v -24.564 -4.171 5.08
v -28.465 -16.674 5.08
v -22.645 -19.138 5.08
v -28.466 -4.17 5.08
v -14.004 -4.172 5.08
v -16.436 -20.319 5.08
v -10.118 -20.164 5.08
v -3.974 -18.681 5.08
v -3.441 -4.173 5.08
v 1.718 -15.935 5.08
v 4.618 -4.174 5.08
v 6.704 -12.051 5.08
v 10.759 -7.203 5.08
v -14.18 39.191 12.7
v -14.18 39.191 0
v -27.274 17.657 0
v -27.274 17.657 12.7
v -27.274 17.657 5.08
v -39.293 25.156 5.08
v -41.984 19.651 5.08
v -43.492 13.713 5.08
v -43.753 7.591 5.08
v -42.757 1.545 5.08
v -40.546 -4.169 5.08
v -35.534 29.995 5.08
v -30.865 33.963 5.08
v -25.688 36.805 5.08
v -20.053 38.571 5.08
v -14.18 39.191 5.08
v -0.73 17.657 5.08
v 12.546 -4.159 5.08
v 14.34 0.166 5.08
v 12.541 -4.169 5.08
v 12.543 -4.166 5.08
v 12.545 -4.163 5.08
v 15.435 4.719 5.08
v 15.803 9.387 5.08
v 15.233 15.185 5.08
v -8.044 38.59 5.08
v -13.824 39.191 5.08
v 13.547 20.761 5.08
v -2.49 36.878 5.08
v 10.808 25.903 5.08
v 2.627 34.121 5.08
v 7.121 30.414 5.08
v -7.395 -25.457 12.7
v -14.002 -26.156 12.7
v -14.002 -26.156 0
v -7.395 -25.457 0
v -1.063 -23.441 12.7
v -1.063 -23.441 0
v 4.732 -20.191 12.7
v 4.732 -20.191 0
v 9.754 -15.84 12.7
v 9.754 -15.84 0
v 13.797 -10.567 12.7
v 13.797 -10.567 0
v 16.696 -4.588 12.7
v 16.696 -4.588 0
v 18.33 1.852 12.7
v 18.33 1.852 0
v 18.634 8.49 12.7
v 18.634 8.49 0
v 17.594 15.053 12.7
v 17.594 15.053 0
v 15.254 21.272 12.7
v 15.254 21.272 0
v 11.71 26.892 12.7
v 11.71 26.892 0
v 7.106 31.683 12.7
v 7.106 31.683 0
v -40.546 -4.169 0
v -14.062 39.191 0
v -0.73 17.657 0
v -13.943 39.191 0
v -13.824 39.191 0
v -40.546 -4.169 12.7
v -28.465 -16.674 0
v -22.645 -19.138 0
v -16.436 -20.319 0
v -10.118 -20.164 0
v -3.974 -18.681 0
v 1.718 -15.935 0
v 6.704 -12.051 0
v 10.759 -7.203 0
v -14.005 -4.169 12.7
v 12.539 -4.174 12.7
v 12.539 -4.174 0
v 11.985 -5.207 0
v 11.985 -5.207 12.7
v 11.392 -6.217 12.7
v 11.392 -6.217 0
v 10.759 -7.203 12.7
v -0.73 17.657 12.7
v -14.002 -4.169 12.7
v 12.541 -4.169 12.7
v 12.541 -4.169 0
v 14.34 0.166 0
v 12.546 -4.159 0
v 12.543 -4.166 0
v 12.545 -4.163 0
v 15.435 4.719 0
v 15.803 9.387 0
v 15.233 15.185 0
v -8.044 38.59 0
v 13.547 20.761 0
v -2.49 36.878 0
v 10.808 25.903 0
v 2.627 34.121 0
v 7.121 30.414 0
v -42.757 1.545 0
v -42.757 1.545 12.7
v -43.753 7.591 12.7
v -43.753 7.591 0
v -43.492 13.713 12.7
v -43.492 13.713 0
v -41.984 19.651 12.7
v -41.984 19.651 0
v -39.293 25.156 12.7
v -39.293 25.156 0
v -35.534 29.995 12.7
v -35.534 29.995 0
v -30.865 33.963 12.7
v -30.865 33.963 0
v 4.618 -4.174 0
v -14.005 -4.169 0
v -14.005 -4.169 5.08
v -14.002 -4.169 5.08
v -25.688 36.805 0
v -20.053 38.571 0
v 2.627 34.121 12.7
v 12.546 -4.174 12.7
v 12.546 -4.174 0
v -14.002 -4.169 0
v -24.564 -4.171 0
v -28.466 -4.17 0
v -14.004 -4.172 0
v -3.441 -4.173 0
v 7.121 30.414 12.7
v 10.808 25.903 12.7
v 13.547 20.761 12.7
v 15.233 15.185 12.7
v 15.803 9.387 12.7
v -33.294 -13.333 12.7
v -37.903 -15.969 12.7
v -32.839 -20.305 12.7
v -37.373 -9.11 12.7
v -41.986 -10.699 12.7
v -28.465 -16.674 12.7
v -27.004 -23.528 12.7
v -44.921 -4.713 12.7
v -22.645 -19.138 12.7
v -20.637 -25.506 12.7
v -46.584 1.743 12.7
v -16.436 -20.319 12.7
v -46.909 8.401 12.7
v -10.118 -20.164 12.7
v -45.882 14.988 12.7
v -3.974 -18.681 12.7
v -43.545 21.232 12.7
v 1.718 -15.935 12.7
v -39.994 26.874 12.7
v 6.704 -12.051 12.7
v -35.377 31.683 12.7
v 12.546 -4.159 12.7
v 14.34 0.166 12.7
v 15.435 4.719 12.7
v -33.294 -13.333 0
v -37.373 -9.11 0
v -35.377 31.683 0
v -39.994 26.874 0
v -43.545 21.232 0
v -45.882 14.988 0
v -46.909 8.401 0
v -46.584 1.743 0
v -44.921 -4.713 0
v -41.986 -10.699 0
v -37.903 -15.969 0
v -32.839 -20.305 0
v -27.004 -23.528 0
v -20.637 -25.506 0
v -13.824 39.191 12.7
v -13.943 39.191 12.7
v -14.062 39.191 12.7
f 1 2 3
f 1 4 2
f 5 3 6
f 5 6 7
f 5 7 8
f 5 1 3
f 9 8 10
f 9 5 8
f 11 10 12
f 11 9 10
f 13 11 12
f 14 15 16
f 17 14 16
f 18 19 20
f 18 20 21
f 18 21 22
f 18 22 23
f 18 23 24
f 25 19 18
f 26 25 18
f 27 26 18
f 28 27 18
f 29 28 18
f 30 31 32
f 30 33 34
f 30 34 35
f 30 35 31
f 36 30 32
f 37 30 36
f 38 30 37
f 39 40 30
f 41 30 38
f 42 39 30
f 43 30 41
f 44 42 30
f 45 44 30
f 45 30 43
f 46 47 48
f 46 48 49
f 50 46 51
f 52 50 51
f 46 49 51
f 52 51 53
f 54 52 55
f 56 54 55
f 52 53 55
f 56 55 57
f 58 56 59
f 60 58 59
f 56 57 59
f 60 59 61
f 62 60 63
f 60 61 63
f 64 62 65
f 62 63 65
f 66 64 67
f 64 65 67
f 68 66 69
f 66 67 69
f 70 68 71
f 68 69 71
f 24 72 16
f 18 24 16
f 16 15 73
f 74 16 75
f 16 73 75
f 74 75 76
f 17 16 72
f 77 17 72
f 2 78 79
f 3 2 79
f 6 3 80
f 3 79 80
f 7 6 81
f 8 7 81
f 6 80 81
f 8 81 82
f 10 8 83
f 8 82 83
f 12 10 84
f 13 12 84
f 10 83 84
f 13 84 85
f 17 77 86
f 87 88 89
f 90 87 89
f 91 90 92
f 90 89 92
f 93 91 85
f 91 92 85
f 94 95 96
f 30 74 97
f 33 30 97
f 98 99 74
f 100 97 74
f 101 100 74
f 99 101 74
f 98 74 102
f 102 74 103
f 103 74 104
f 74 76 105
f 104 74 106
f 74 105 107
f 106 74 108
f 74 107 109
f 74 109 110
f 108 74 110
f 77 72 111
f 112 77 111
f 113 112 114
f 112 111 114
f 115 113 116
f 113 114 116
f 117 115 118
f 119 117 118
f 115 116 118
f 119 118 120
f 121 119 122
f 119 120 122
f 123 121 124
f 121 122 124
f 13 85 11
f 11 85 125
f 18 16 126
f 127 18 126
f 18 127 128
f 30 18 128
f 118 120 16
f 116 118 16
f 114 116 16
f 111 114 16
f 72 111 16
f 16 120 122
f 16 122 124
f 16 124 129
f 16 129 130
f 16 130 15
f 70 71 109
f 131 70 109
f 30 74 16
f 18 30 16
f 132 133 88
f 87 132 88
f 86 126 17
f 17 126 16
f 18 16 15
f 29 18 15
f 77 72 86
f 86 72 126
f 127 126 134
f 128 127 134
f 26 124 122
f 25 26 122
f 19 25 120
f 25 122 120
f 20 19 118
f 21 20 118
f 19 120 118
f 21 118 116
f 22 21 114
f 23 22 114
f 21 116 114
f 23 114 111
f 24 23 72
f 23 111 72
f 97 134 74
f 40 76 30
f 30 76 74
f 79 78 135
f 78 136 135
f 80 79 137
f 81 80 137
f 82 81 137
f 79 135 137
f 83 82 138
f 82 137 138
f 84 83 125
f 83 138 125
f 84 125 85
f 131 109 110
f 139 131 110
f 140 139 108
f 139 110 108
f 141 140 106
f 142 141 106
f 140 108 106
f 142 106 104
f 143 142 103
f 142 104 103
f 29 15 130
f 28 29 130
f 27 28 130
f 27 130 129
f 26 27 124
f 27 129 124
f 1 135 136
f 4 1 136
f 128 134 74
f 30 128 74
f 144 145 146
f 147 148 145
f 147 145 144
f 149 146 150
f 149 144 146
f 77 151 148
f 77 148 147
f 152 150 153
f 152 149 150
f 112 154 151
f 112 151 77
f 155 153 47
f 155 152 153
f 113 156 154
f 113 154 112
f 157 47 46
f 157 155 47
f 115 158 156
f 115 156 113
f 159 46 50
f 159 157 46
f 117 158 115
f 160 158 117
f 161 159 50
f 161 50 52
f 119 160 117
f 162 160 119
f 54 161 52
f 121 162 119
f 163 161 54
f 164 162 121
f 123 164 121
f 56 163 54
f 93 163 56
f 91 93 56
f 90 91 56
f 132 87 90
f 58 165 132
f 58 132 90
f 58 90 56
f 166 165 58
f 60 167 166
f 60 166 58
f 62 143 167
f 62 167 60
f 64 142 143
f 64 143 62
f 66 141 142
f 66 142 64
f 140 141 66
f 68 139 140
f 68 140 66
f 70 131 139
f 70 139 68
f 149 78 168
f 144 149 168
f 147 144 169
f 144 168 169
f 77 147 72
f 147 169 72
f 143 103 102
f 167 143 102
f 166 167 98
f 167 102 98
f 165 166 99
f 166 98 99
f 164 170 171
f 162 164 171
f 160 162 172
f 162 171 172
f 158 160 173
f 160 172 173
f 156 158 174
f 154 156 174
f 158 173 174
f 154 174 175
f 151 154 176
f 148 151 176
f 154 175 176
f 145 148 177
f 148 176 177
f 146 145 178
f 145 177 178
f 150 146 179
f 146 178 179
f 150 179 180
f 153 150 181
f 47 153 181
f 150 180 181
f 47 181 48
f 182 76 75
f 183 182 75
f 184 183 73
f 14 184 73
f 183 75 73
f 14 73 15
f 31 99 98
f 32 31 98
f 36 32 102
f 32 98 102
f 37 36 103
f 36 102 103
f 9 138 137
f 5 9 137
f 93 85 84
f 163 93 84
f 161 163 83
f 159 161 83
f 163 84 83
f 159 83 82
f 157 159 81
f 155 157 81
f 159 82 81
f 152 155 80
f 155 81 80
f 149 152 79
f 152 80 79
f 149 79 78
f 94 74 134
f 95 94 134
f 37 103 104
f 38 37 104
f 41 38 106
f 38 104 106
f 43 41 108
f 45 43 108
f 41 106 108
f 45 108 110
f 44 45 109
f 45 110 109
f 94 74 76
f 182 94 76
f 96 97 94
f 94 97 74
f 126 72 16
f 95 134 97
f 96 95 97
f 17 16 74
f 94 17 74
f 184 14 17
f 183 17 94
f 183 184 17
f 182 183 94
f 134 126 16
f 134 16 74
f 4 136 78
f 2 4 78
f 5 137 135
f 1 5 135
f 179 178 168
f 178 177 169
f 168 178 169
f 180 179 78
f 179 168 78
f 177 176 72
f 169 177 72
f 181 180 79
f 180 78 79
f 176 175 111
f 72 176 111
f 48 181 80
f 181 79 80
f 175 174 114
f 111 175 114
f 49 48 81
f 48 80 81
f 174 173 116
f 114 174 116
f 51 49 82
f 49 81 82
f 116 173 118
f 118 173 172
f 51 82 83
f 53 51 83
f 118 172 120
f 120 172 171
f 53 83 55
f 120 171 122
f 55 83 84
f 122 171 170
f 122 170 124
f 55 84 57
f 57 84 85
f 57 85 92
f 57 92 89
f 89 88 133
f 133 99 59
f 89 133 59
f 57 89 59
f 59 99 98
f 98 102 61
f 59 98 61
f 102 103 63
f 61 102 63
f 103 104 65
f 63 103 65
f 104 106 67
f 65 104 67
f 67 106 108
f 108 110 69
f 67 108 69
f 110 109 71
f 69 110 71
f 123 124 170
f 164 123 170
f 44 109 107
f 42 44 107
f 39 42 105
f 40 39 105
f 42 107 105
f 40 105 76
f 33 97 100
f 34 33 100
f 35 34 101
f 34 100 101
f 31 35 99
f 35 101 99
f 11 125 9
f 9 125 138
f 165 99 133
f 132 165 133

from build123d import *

# Parameters (mm, degrees)
F1_DEPTH = 12.7
F2_DEPTH = 5.08


# Not quite as in the source:
# - a feature names something its author has since deleted; it is built from what else it names


with BuildPart() as f1:
    # F0 (on Top) → F1 (new body)
    with BuildSketch(Plane.XY):
        with BuildLine():
            Line((-0.7304638443, 17.6570977744), (-13.8243847458, 39.1909619838))
            ThreePointArc((-13.8243847458, 39.1909619838), (-14.0022787977, 39.1914928804), (-14.1801728496, 39.1909619839))
            Line((-14.1801728496, 39.1909619839), (-27.2740937544, 17.6570977744))
            Line((-27.2740937544, 17.6570977744), (-0.7304638443, 17.6570977744))
        make_face()
    extrude(amount=F1_DEPTH)


with BuildPart() as f1b:
    # F0 (on Top) → F1, piece 2 (new body)
    with BuildSketch(Plane.XY):
        Polygon((-14.0052981097, -4.1693255842), (-27.2740937544, 17.6570977744), (-40.5459087111, -4.1693255842), (-28.4659001209, -4.1693255842), (-24.5637800544, -4.1693255842), align=None)
    extrude(amount=F1_DEPTH)


with BuildPart() as f1c:
    # F0 (on Top) → F1, piece 3 (new body)
    with BuildSketch(Plane.XY):
        Polygon((4.6093779556, -4.1693255842), (12.5413511092, -4.1693255842), (-0.7304638443, 17.6570977744), (-14.002278801, -4.1693255842), (-3.4407775408, -4.1693255842), align=None)
    extrude(amount=F1_DEPTH)


with BuildPart() as f1d:
    # F0 (on Top) → F1, piece 4 (new body)
    with BuildSketch(Plane.XY):
        with BuildLine():
            ThreePointArc((2.6267673161, 34.121311843), (12.3031850523, 23.3991896828), (15.8025652754, 9.386648804))
            ThreePointArc((15.8025652754, 9.386648804), (14.9770861572, 2.4206501647), (12.5463739719, -4.1594859348))
            Line((12.5463739719, -4.1594859348), (12.546375676, -4.1742923649))
            Line((12.546375676, -4.1742923649), (12.5388143231, -4.1742916575))
            ThreePointArc((12.5388143231, -4.1742916575), (11.6934665545, -5.7149206854), (10.7587911193, -7.2030512181))
            ThreePointArc((10.7587911193, -7.2030512181), (-7.0067815574, -19.5856094569), (-28.4652345808, -16.6738891899))
            ThreePointArc((-28.4652345808, -16.6738891899), (-35.4376711517, -11.3221098549), (-40.5459087111, -4.1693255842))
            ThreePointArc((-40.5459087111, -4.1693255842), (-42.8906697283, 16.7207881569), (-30.8650428104, 33.9625703611))
            Line((-30.8650428104, 33.9625703611), (-35.3768183074, 31.682918978))
            ThreePointArc((-35.3768183074, 31.682918978), (-44.9205686415, -4.7129685745), (-14.0022787977, -26.1559896842))
            ThreePointArc((-14.0022787977, -26.1559896842), (16.6955901847, -4.587967654), (7.1059333978, 31.682918978))
            Line((7.1059333978, 31.682918978), (2.6267673161, 34.121311843))
        make_face()
    extrude(amount=F1_DEPTH)


with BuildPart() as f2:
    # F0 (on Top) → F2 (new body)
    with BuildSketch(Plane.XY):
        Polygon((-14.002278801, -4.1693255842), (-0.7304638443, 17.6570977744), (-27.2740937544, 17.6570977744), (-14.0052981097, -4.1693255842), align=None)
    extrude(amount=F2_DEPTH)


with BuildPart() as f2b:
    # F0 (on Top) → F2, piece 2 (new body)
    with BuildSketch(Plane.XY):
        with BuildLine():
            ThreePointArc((-28.4652345808, -16.6738891899), (-7.0067815574, -19.5856094569), (10.7587911193, -7.2030512181))
            Line((10.7587911193, -7.2030512181), (4.6179422563, -4.1735506603))
            Line((4.6179422563, -4.1735506603), (-3.4407775408, -4.1727967674))
            Line((-3.4407775408, -4.1727967674), (-14.0037886271, -4.1718085983))
            Line((-14.0037886271, -4.1718085983), (-24.5637800544, -4.1708207116))
            Line((-24.5637800544, -4.1708207116), (-28.4659000607, -4.1704556684))
            Line((-28.4659000607, -4.1704556684), (-28.4652345808, -16.6738891899))
        make_face()
    extrude(amount=F2_DEPTH)


with BuildPart() as f2c:
    # F0 (on Top) → F2, piece 3 (new body)
    with BuildSketch(Plane.XY):
        with BuildLine():
            Line((-27.2740937544, 17.6570977744), (-14.1801728496, 39.1909619839))
            ThreePointArc((-14.1801728496, 39.1909619839), (-22.9146312684, 37.8277933645), (-30.8650428104, 33.9625703611))
            ThreePointArc((-30.8650428104, 33.9625703611), (-42.8906697283, 16.7207881569), (-40.5459087111, -4.1693255842))
            Line((-40.5459087111, -4.1693255842), (-27.2740937544, 17.6570977744))
        make_face()
    extrude(amount=F2_DEPTH)


with BuildPart() as f2d:
    # F0 (on Top) → F2, piece 4 (new body)
    with BuildSketch(Plane.XY):
        with BuildLine():
            ThreePointArc((12.5463739719, -4.1594859348), (14.9770861572, 2.4206501647), (15.8025652754, 9.386648804))
            ThreePointArc((15.8025652754, 9.386648804), (12.3031850523, 23.3991896828), (2.6267673161, 34.121311843))
            ThreePointArc((2.6267673161, 34.121311843), (-5.2248277116, 37.8697154014), (-13.8243847458, 39.1909619838))
            Line((-13.8243847458, 39.1909619838), (-0.7304638443, 17.6570977744))
            Line((-0.7304638443, 17.6570977744), (12.5413511092, -4.1693255842))
            ThreePointArc((12.5413511092, -4.1693255842), (12.5438629964, -4.1644059922), (12.5463739719, -4.1594859348))
        make_face()
    extrude(amount=F2_DEPTH)


solid = Compound([f1.part, f1b.part, f1c.part, f1d.part, f2.part, f2b.part, f2c.part, f2d.part])
